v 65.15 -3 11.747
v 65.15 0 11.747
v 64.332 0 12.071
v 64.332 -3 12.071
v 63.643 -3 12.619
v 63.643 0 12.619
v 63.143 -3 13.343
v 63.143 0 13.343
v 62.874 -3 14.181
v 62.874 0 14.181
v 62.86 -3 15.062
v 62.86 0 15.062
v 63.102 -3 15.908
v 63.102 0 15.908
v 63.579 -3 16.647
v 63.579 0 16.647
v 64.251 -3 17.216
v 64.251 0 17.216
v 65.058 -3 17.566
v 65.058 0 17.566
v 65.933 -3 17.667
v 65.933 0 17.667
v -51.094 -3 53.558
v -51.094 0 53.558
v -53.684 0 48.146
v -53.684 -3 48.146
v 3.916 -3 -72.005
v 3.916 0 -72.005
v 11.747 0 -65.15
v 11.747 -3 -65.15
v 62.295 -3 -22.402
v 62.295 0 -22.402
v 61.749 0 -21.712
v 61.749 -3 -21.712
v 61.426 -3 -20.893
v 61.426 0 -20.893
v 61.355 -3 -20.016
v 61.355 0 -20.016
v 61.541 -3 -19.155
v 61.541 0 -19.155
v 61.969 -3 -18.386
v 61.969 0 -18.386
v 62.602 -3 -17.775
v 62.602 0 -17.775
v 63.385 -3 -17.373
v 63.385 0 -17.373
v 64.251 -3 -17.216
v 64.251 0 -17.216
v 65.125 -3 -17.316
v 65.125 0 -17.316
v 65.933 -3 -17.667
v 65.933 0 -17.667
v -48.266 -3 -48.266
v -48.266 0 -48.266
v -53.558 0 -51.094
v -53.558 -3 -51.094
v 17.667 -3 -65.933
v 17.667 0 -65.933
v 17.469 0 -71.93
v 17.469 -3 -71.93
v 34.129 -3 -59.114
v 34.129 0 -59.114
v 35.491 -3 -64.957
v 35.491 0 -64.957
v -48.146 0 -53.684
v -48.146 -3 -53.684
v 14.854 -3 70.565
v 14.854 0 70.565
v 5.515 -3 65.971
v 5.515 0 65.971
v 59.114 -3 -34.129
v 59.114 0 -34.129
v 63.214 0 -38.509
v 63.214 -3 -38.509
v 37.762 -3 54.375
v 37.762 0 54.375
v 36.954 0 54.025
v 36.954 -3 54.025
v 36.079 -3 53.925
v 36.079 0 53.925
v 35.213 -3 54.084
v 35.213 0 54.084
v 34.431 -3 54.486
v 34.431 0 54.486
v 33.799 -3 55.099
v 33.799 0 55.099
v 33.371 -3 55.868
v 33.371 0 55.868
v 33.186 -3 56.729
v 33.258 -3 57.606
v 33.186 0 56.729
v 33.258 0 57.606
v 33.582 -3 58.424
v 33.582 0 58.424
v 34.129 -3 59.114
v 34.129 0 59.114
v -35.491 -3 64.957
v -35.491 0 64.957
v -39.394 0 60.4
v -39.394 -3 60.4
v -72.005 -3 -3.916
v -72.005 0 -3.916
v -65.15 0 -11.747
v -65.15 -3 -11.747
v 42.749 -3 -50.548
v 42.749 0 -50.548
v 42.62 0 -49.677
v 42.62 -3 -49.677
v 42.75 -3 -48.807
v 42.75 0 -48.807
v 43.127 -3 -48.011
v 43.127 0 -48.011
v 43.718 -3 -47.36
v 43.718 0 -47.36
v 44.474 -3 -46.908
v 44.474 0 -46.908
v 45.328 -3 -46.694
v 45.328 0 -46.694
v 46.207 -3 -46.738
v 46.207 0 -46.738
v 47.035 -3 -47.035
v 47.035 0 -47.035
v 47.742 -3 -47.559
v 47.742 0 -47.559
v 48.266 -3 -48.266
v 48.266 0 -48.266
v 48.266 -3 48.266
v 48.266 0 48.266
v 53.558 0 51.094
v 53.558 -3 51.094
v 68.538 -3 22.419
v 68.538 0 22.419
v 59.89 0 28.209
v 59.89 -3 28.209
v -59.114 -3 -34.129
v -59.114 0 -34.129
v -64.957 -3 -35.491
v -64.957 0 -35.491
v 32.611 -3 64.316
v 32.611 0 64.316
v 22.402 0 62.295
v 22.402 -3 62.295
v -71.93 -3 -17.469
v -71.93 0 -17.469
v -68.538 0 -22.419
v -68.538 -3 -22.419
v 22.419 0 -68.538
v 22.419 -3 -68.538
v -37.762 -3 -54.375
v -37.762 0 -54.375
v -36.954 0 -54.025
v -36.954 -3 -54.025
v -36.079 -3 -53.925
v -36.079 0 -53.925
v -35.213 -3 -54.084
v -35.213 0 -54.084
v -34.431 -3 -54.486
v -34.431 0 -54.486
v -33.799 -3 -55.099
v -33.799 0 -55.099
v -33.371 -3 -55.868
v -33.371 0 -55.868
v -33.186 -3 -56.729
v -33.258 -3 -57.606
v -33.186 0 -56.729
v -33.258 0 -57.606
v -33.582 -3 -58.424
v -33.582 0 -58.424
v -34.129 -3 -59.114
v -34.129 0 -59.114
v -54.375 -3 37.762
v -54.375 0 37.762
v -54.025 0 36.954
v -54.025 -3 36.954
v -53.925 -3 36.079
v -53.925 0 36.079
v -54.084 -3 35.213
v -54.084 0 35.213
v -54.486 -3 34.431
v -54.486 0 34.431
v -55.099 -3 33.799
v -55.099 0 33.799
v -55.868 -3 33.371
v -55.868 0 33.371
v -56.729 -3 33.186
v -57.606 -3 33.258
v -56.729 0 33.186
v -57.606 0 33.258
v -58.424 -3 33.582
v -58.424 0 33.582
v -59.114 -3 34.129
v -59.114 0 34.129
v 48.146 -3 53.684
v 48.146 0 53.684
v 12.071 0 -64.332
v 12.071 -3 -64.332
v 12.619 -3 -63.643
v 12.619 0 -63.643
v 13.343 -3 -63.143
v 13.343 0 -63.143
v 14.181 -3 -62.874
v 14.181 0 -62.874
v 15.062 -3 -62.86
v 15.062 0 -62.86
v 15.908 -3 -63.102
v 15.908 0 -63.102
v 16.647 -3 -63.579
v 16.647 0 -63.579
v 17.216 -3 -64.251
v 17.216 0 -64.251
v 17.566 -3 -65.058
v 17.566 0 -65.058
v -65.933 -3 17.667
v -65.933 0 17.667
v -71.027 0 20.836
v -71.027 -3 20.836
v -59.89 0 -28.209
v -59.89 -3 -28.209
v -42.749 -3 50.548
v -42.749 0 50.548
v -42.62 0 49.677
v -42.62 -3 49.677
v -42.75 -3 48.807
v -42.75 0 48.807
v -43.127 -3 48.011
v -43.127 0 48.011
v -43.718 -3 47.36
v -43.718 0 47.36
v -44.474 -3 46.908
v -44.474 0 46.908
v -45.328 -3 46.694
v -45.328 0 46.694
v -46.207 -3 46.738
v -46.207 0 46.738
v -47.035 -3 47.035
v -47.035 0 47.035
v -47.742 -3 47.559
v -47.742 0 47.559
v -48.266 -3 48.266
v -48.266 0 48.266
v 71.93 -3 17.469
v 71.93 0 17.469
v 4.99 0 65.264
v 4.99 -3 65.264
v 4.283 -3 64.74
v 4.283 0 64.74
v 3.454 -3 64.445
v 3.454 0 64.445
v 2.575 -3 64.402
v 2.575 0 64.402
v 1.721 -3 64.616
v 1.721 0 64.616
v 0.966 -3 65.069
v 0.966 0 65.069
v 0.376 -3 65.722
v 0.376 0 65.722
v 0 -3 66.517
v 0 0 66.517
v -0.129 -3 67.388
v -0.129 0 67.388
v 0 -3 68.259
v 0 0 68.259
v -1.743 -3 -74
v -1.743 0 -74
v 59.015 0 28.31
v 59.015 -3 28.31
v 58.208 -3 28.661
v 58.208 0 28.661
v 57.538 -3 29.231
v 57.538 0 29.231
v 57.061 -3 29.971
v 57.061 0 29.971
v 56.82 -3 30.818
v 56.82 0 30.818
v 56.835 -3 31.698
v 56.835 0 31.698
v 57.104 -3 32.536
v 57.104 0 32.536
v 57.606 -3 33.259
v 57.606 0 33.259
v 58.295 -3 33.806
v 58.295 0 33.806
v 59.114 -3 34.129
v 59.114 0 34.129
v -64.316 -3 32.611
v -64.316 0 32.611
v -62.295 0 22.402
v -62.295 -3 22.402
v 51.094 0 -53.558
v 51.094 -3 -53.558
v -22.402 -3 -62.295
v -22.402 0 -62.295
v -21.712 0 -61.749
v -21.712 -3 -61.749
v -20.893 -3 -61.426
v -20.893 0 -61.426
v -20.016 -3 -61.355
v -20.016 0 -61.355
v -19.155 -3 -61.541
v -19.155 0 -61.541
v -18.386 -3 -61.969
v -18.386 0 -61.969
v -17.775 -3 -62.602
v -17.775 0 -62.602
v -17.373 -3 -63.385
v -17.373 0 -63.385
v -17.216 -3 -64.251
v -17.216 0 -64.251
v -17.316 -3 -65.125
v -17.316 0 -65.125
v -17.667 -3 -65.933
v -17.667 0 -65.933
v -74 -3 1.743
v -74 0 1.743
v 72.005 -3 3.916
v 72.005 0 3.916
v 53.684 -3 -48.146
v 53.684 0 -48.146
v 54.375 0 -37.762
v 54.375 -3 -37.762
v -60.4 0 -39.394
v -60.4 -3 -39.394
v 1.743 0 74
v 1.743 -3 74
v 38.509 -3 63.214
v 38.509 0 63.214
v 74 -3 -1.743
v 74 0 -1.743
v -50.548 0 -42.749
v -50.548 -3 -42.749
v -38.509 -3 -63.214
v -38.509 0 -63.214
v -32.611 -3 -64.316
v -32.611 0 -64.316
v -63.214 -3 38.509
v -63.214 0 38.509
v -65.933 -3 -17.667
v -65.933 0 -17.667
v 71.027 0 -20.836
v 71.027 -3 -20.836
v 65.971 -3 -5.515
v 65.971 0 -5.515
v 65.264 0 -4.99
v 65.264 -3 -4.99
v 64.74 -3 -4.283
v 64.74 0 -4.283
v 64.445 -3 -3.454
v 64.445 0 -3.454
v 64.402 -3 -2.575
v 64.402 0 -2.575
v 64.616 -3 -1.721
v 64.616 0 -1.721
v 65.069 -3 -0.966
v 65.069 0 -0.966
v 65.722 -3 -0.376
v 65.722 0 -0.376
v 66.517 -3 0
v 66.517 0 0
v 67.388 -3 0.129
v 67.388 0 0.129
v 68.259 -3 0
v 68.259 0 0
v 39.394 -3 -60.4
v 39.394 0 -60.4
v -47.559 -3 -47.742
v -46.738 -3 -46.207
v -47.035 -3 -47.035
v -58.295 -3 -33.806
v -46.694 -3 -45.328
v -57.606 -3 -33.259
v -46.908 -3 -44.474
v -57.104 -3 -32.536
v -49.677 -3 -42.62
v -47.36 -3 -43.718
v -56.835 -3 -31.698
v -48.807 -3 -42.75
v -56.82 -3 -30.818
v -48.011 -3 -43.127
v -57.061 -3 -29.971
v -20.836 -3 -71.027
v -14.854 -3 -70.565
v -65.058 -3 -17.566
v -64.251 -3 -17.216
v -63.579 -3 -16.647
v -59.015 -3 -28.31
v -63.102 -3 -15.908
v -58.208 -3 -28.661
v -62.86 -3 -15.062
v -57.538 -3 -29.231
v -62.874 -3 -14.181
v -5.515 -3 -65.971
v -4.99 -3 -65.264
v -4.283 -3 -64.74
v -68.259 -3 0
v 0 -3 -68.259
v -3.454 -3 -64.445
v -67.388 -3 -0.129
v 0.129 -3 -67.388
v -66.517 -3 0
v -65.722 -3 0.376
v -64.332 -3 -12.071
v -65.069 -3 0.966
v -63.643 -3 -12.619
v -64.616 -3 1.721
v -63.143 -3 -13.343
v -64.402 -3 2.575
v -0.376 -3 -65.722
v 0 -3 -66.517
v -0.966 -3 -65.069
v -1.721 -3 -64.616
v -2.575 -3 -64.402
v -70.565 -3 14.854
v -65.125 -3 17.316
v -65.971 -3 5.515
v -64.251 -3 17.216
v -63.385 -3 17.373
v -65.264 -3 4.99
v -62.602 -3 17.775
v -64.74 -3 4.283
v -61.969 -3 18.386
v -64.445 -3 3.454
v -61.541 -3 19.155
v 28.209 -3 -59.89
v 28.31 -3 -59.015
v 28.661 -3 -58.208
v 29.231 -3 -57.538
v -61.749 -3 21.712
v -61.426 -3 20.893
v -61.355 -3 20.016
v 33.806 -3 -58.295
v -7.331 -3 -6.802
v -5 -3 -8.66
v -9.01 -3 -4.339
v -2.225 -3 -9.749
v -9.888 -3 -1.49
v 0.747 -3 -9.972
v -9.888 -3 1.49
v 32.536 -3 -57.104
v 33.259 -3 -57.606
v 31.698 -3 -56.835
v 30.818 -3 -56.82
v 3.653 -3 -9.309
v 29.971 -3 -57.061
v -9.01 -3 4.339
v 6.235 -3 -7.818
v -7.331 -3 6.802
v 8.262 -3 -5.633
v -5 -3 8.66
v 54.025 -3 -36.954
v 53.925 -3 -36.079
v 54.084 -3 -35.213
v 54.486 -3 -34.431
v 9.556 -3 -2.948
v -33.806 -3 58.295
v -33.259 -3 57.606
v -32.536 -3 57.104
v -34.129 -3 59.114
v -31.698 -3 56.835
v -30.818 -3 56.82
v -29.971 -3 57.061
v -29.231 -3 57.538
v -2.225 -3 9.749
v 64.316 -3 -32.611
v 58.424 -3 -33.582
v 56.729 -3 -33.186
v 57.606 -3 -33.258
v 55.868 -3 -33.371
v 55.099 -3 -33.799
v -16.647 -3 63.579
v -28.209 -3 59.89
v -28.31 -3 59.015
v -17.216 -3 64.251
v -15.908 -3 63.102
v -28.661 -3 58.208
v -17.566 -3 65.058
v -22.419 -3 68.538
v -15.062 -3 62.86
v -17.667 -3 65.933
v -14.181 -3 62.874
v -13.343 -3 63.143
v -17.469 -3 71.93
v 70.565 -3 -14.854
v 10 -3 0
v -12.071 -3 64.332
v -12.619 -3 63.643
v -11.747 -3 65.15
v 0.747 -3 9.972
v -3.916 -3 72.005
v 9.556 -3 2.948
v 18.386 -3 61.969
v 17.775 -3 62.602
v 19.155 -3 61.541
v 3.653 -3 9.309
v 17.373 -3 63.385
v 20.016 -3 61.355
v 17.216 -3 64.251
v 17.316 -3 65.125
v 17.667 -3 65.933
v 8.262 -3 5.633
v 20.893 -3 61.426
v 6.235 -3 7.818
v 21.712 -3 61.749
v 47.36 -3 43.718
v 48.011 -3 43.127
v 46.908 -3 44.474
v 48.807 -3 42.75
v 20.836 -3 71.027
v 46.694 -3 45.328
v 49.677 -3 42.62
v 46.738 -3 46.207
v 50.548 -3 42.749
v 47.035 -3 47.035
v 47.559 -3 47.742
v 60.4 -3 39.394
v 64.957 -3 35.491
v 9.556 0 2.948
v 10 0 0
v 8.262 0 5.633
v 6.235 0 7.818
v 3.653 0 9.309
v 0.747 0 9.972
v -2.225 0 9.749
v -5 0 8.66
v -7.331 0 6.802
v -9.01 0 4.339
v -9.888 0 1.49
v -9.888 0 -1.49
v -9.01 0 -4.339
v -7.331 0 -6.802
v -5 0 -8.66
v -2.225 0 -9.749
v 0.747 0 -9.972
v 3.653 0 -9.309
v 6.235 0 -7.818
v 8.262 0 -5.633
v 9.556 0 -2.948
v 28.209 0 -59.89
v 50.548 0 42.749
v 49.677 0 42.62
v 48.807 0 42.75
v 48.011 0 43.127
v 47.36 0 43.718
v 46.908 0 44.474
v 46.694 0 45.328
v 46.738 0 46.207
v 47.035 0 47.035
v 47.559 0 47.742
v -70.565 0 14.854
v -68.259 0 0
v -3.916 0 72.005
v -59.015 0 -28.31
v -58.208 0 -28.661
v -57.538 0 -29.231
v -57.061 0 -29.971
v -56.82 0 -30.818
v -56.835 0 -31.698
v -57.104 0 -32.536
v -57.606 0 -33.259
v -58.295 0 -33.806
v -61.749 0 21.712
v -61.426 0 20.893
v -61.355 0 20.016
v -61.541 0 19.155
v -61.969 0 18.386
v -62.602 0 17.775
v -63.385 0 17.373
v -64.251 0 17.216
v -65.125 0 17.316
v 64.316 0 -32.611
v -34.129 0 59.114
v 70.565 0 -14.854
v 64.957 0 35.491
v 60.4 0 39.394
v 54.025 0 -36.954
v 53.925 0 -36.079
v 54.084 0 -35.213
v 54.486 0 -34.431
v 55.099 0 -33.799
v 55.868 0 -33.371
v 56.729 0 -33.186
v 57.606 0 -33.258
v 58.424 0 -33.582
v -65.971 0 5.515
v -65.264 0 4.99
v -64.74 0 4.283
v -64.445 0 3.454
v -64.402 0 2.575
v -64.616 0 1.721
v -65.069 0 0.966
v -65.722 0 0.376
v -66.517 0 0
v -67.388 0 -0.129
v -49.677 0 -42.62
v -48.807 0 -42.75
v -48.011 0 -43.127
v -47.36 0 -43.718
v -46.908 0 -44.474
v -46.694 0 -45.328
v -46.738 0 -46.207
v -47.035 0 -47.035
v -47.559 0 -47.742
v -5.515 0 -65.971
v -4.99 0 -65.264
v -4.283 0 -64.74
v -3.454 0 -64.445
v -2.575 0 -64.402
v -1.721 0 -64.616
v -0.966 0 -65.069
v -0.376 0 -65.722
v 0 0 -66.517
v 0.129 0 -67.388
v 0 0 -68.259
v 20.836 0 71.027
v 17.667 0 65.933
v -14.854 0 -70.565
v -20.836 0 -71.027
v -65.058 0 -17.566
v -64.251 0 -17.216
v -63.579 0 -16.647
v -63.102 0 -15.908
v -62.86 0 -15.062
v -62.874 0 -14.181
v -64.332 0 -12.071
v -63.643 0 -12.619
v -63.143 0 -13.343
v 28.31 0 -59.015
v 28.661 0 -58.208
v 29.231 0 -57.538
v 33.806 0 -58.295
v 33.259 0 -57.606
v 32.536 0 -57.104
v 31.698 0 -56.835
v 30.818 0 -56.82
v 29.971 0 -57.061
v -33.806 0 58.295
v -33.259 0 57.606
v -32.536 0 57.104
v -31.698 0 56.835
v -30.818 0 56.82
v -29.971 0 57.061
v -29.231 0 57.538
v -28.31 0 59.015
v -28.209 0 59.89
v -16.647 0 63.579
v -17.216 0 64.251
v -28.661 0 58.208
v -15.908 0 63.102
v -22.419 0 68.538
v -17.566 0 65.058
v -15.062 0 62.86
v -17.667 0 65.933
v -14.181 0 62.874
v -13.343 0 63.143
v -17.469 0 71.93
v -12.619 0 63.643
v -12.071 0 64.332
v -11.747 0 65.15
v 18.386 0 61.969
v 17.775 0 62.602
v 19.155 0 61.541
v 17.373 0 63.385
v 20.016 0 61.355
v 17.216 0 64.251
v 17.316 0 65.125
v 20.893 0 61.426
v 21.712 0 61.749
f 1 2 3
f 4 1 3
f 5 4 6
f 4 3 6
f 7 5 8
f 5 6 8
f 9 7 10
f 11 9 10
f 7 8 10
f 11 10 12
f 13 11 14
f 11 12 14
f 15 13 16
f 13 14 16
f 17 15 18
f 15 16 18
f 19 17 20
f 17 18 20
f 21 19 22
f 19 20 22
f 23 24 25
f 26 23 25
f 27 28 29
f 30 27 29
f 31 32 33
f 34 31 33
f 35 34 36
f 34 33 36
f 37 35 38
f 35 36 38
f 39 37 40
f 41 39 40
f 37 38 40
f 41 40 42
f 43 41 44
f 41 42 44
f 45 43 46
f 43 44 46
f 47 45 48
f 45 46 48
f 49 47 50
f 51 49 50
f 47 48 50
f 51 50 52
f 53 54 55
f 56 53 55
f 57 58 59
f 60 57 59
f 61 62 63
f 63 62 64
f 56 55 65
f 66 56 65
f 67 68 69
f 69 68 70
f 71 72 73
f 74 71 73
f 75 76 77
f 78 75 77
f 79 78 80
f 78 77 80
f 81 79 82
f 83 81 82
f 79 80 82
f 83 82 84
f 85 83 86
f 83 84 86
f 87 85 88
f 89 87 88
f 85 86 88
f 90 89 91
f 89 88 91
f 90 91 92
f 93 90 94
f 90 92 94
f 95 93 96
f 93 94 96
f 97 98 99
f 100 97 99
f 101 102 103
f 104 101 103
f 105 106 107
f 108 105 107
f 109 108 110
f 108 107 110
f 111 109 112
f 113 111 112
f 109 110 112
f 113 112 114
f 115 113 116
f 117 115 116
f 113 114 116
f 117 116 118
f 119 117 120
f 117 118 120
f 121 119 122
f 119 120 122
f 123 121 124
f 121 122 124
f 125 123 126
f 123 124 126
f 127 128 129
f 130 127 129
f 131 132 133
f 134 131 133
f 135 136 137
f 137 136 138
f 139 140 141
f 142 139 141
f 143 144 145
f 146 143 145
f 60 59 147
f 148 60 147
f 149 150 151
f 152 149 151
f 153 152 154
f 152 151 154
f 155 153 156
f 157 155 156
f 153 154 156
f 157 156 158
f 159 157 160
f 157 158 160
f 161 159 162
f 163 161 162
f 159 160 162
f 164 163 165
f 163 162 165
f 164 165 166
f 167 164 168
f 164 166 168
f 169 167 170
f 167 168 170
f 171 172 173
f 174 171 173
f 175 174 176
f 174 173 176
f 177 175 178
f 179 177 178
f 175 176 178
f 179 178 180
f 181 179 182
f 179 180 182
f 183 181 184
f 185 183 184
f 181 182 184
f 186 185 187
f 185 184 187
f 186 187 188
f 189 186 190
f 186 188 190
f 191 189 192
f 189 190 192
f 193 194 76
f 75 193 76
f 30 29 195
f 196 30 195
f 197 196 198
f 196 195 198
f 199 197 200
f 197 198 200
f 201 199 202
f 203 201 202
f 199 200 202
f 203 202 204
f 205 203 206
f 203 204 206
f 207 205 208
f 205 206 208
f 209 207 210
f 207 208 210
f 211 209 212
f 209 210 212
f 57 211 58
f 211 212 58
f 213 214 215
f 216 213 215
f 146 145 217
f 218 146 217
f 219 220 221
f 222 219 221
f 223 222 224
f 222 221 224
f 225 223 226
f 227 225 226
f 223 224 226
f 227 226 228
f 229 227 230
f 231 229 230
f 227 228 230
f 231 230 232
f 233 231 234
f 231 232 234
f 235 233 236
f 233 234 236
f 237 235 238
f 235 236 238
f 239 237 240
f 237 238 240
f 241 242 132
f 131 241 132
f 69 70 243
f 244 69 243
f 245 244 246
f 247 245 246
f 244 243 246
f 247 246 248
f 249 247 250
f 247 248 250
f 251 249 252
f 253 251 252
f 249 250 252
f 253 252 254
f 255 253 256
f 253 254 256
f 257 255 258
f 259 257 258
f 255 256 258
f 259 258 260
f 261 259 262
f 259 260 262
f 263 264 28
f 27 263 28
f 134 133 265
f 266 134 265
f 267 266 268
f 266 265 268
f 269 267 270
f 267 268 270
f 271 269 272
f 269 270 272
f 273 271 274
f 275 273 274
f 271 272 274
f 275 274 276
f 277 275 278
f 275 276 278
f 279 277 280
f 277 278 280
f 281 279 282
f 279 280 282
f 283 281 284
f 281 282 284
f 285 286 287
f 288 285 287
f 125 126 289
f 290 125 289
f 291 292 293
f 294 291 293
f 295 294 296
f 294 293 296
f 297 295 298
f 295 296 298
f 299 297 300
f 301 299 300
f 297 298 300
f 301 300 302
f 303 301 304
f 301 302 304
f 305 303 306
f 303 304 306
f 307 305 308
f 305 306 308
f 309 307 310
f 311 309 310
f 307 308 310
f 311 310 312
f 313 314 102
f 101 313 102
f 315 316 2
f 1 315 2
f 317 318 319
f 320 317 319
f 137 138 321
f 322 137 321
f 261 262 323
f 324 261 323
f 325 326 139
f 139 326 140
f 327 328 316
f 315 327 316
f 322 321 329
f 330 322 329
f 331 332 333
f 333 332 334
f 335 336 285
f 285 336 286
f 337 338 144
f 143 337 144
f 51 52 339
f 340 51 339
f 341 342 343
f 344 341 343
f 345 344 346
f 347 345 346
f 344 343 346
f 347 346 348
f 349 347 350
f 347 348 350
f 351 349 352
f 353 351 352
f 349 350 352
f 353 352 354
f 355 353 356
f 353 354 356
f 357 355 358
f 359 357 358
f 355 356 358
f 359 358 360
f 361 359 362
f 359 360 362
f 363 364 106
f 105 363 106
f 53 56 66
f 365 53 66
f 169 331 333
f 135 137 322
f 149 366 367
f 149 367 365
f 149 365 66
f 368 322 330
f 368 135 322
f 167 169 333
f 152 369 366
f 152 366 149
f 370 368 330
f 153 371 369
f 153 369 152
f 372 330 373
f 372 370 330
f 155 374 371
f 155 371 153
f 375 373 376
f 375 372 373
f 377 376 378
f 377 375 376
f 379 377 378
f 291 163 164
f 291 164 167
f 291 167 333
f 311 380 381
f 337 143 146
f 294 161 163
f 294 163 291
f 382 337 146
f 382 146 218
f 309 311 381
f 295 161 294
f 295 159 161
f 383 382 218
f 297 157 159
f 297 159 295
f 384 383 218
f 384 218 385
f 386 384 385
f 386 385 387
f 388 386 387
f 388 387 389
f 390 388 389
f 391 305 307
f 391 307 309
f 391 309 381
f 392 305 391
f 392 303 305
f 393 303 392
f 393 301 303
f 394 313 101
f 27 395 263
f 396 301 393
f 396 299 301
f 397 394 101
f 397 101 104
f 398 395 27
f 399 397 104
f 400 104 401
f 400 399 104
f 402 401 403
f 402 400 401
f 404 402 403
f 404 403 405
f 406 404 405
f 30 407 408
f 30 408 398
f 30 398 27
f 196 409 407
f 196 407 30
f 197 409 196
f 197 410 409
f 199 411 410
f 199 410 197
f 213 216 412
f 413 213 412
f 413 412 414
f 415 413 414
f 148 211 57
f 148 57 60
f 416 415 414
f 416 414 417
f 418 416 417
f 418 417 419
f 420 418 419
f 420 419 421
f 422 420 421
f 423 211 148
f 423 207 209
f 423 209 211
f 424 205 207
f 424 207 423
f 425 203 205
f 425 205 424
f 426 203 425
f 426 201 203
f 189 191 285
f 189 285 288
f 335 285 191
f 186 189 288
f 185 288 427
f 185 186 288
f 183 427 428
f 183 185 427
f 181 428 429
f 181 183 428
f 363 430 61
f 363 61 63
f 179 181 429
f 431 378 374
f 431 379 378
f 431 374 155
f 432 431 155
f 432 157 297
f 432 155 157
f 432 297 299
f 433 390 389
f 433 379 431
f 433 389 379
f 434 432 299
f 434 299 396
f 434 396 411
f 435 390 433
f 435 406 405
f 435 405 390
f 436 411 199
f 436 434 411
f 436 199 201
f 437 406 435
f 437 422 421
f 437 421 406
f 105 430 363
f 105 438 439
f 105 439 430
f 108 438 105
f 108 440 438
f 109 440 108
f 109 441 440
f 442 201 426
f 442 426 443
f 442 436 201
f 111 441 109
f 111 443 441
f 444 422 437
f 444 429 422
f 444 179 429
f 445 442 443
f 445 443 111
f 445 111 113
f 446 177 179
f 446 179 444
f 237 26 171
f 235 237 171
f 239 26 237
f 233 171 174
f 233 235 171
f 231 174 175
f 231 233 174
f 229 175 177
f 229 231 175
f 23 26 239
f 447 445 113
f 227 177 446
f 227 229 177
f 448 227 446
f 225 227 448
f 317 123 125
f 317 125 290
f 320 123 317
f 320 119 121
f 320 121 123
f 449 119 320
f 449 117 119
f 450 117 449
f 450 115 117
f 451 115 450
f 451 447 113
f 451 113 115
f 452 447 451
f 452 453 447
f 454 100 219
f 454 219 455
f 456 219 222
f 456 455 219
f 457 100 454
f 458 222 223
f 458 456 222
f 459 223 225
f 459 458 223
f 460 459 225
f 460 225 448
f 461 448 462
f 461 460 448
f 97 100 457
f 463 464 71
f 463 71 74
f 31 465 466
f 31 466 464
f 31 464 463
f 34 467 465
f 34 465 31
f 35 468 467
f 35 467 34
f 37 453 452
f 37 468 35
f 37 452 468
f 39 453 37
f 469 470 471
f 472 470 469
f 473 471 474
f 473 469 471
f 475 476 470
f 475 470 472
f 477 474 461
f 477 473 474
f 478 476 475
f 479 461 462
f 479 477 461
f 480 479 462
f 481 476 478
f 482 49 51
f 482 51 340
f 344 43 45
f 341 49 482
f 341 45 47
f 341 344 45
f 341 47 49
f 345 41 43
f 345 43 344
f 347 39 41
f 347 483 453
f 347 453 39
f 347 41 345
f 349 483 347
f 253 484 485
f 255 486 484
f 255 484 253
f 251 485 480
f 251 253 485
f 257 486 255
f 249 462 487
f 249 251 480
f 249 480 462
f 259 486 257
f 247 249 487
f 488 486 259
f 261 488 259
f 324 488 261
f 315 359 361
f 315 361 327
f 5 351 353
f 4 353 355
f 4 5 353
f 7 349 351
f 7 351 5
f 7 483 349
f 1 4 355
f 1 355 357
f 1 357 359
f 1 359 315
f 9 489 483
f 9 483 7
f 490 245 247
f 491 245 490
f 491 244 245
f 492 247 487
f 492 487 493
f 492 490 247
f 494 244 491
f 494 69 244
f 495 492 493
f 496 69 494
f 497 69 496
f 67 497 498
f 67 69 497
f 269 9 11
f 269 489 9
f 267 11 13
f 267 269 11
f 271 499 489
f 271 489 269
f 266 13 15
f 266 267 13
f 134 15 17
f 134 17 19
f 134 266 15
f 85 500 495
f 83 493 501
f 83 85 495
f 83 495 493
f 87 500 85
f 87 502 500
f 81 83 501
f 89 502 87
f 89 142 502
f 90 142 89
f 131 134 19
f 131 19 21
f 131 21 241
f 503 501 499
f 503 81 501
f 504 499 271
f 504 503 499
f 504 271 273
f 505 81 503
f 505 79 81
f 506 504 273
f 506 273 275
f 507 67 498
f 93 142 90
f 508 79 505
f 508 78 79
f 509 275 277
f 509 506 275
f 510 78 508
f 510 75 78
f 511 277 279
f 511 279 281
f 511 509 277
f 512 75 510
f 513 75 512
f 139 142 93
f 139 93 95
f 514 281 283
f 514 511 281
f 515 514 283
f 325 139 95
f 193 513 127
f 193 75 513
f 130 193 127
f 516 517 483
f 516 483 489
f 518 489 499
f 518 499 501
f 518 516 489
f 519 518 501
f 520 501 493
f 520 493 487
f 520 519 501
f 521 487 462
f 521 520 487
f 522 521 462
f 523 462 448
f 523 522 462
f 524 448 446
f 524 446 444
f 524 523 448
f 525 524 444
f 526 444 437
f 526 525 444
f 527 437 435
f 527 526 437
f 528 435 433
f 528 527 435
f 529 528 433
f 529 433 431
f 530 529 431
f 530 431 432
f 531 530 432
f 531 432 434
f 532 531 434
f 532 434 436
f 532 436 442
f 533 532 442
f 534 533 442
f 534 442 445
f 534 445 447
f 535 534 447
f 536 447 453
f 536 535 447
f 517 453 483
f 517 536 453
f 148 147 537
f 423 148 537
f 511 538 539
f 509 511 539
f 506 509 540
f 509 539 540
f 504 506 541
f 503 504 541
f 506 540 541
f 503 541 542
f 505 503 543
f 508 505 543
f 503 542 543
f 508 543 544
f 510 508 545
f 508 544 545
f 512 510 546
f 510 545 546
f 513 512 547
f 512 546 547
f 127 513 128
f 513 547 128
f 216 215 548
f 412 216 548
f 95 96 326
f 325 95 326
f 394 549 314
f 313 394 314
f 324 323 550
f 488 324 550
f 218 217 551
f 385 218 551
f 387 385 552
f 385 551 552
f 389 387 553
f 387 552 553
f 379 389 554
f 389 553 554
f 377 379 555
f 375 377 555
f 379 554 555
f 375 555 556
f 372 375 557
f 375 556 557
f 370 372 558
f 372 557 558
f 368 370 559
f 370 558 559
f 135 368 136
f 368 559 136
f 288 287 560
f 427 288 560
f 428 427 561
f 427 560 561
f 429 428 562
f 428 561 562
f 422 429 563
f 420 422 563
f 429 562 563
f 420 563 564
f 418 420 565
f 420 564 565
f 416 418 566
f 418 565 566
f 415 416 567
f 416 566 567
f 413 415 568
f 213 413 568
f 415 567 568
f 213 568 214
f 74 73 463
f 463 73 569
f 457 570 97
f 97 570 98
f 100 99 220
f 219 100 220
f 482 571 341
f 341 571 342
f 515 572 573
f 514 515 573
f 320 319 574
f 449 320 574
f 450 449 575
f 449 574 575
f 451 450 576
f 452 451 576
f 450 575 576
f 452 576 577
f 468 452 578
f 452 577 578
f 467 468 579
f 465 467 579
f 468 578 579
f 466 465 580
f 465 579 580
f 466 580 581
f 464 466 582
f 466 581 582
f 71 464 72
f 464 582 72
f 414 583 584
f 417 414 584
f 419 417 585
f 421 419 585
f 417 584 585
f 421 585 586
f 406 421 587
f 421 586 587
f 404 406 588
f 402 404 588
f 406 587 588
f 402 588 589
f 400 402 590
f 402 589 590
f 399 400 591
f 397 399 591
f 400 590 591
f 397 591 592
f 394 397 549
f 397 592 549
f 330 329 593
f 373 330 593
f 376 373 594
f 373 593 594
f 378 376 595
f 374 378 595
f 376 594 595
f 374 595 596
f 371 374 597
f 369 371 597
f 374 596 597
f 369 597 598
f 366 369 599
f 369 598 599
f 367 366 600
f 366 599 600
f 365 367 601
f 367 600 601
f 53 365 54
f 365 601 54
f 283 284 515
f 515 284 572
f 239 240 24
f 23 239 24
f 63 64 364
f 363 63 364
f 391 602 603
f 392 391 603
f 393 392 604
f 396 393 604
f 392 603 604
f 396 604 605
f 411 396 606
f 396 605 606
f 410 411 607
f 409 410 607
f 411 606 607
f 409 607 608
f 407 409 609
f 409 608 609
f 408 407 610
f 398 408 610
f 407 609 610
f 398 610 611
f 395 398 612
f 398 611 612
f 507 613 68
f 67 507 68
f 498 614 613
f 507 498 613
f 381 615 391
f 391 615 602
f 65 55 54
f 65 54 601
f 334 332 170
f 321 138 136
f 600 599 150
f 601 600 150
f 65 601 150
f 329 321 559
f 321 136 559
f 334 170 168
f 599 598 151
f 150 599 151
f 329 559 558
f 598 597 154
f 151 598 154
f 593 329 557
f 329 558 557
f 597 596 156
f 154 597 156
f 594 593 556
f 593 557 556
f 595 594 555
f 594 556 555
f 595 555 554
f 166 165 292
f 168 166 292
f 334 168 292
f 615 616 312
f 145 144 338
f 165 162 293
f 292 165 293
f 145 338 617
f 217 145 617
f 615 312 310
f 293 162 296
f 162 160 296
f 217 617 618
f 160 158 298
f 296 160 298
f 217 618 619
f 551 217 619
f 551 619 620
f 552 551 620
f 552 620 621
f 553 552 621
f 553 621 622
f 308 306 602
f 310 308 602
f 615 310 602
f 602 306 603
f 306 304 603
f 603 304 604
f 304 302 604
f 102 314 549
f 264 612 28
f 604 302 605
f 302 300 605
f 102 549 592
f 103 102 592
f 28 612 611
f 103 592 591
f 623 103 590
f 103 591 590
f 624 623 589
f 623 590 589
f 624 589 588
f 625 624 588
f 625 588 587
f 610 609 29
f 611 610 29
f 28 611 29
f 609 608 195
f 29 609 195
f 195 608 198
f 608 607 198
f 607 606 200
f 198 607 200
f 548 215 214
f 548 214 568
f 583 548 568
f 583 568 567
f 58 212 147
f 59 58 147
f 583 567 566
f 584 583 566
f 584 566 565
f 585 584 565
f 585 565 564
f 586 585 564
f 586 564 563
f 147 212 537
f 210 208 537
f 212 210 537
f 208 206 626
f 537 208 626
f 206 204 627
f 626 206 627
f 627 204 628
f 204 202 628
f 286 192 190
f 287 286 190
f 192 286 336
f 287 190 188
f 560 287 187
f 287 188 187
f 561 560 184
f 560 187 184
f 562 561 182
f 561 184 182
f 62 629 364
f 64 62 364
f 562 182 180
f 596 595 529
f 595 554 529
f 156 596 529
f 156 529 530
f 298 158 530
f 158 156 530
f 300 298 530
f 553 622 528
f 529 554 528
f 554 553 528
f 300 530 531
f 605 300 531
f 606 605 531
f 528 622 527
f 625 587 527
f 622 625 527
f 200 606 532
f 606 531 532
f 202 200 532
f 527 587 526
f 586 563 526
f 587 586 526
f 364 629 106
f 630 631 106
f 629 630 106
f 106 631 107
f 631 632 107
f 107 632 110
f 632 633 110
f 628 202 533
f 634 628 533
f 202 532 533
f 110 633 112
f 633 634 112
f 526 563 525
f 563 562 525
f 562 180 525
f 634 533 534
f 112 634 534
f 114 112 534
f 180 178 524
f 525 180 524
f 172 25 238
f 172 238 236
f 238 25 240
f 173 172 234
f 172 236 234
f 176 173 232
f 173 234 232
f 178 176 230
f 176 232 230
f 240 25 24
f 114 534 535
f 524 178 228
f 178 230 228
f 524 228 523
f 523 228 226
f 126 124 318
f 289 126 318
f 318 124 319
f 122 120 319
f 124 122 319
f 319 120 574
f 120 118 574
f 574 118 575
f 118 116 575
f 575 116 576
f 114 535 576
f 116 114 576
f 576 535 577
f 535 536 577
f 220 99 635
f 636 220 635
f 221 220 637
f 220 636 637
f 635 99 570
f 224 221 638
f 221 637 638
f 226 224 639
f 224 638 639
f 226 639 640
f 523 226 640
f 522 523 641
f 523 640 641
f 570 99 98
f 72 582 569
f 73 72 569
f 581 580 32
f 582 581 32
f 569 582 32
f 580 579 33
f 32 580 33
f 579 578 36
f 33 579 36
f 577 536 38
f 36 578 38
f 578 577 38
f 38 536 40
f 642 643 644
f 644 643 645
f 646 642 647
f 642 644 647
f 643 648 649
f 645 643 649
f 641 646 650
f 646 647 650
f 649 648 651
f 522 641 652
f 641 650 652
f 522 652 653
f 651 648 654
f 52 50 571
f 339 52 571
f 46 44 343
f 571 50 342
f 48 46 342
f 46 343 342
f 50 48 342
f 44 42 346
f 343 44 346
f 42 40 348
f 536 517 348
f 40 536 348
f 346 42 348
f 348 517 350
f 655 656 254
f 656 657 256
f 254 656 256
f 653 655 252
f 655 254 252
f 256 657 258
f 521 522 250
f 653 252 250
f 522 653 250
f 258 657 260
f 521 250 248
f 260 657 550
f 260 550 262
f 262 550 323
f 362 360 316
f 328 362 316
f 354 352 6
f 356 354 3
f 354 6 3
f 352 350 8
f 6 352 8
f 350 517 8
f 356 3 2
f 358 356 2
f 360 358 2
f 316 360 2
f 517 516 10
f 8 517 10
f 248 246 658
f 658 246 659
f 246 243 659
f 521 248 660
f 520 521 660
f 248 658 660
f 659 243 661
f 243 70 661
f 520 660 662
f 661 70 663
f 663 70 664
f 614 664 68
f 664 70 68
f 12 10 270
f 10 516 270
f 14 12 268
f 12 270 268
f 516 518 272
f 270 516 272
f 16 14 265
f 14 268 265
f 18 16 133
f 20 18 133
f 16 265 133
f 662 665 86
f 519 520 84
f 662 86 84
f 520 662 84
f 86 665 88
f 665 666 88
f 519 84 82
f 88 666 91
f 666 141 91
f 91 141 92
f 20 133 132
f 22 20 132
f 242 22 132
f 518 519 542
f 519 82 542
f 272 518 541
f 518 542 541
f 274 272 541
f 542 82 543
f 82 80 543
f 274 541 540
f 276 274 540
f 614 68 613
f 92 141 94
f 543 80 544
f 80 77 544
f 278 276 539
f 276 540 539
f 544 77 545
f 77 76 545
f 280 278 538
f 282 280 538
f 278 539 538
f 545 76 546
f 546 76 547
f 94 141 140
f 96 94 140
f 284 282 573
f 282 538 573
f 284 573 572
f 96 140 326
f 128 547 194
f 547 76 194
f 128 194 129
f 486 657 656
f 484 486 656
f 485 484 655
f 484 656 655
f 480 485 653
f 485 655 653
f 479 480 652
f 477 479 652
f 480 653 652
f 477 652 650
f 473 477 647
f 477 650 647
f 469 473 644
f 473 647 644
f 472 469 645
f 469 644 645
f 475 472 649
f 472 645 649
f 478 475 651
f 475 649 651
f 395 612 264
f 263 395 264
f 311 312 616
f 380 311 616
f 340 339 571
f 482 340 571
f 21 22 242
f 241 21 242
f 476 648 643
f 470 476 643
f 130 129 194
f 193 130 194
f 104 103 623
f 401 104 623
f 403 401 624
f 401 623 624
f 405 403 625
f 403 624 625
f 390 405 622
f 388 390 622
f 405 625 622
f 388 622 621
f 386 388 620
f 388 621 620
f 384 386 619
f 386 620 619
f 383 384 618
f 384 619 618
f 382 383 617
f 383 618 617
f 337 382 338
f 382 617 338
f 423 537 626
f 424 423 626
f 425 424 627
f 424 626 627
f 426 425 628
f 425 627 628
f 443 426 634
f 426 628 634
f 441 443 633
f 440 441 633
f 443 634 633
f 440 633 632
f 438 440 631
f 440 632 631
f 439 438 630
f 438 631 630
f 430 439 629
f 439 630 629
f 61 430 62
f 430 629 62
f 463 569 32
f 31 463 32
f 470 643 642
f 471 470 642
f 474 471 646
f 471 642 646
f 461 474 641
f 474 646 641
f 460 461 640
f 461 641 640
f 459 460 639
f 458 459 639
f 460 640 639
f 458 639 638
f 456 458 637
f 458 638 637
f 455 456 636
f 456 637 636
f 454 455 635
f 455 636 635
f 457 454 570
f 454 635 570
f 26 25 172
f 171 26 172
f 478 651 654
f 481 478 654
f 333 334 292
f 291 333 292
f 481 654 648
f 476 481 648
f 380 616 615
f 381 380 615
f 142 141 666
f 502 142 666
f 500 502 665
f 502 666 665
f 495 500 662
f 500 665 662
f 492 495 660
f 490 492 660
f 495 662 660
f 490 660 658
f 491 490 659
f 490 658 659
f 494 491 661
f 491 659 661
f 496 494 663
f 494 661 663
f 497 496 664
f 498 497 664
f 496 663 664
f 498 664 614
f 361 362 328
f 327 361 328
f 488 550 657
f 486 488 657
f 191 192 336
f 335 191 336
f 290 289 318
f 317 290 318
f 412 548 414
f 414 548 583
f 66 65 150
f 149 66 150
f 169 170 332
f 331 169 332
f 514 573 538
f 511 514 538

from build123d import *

# Parameters (mm, degrees)
F0_R     = 10
F1_DEPTH = 3


with BuildPart() as f1:
    # F0 (on Front) → F1 (new body)
    with BuildSketch(Plane.XZ):
        with BuildLine():
            Line((-3.915787, 72.004935), (-11.747279, 65.150152))
            ThreePointArc((-11.747279, 65.150152), (-15.061523, 62.859987), (-17.66665, 65.932834))
            Line((-17.66665, 65.932834), (-17.469185, 71.929583))
            Line((-17.469185, 71.929583), (-22.418608, 68.537946))
            Line((-22.418608, 68.537946), (-28.209101, 59.889795))
            ThreePointArc((-28.209101, 59.889795), (-30.817676, 56.819876), (-34.129346, 59.113761))
            Line((-34.129346, 59.113761), (-35.490683, 64.957285))
            Line((-35.490683, 64.957285), (-39.393639, 60.400209))
            Line((-39.393639, 60.400209), (-42.748518, 50.548047))
            ThreePointArc((-42.748518, 50.548047), (-44.473655, 46.907584), (-48.266184, 48.266184))
            Line((-48.266184, 48.266184), (-51.093549, 53.558254))
            Line((-51.093549, 53.558254), (-53.684057, 48.146298))
            Line((-53.684057, 48.146298), (-54.374695, 37.761533))
            ThreePointArc((-54.374695, 37.761533), (-55.098828, 33.798618), (-59.113761, 34.129346))
            Line((-59.113761, 34.129346), (-63.214475, 38.509317))
            Line((-63.214475, 38.509317), (-64.315996, 32.611296))
            Line((-64.315996, 32.611296), (-62.295326, 22.401634))
            ThreePointArc((-62.295326, 22.401634), (-61.969107, 18.386332), (-65.932834, 17.66665))
            Line((-65.932834, 17.66665), (-71.027439, 20.836034))
            Line((-71.027439, 20.836034), (-70.564907, 14.853889))
            Line((-70.564907, 14.853889), (-65.970634, 5.5151))
            ThreePointArc((-65.970634, 5.5151), (-64.616294, 1.721047), (-68.258692, 0))
            Line((-68.258692, 0), (-74, 1.742809))
            Line((-74, 1.742809), (-72.004935, -3.915787))
            Line((-72.004935, -3.915787), (-65.150152, -11.747279))
            ThreePointArc((-65.150152, -11.747279), (-62.859987, -15.061523), (-65.932834, -17.66665))
            Line((-65.932834, -17.66665), (-71.929583, -17.469185))
            Line((-71.929583, -17.469185), (-68.537946, -22.418608))
            Line((-68.537946, -22.418608), (-59.889795, -28.209101))
            ThreePointArc((-59.889795, -28.209101), (-56.819876, -30.817676), (-59.113761, -34.129346))
            Line((-59.113761, -34.129346), (-64.957285, -35.490683))
            Line((-64.957285, -35.490683), (-60.400209, -39.393639))
            Line((-60.400209, -39.393639), (-50.548047, -42.748518))
            ThreePointArc((-50.548047, -42.748518), (-46.907584, -44.473655), (-48.266184, -48.266184))
            Line((-48.266184, -48.266184), (-53.558254, -51.093549))
            Line((-53.558254, -51.093549), (-48.146298, -53.684057))
            Line((-48.146298, -53.684057), (-37.761533, -54.374695))
            ThreePointArc((-37.761533, -54.374695), (-33.798618, -55.098828), (-34.129346, -59.113761))
            Line((-34.129346, -59.113761), (-38.509317, -63.214475))
            Line((-38.509317, -63.214475), (-32.611296, -64.315996))
            Line((-32.611296, -64.315996), (-22.401634, -62.295326))
            ThreePointArc((-22.401634, -62.295326), (-18.386332, -61.969107), (-17.66665, -65.932834))
            Line((-17.66665, -65.932834), (-20.836034, -71.027439))
            Line((-20.836034, -71.027439), (-14.853889, -70.564907))
            Line((-14.853889, -70.564907), (-5.5151, -65.970634))
            ThreePointArc((-5.5151, -65.970634), (-1.721047, -64.616294), (0, -68.258692))
            Line((0, -68.258692), (-1.742809, -74))
            Line((-1.742809, -74), (3.915787, -72.004935))
            Line((3.915787, -72.004935), (11.747279, -65.150152))
            ThreePointArc((11.747279, -65.150152), (15.061523, -62.859987), (17.66665, -65.932834))
            Line((17.66665, -65.932834), (17.469185, -71.929583))
            Line((17.469185, -71.929583), (22.418608, -68.537946))
            Line((22.418608, -68.537946), (28.209101, -59.889795))
            ThreePointArc((28.209101, -59.889795), (30.817676, -56.819876), (34.129346, -59.113761))
            Line((34.129346, -59.113761), (35.490683, -64.957285))
            Line((35.490683, -64.957285), (39.393639, -60.400209))
            Line((39.393639, -60.400209), (42.748518, -50.548047))
            ThreePointArc((42.748518, -50.548047), (44.473655, -46.907584), (48.266184, -48.266184))
            Line((48.266184, -48.266184), (51.093549, -53.558254))
            Line((51.093549, -53.558254), (53.684057, -48.146298))
            Line((53.684057, -48.146298), (54.374695, -37.761533))
            ThreePointArc((54.374695, -37.761533), (55.098828, -33.798618), (59.113761, -34.129346))
            Line((59.113761, -34.129346), (63.214475, -38.509317))
            Line((63.214475, -38.509317), (64.315996, -32.611296))
            Line((64.315996, -32.611296), (62.295326, -22.401634))
            ThreePointArc((62.295326, -22.401634), (61.969107, -18.386332), (65.932834, -17.66665))
            Line((65.932834, -17.66665), (71.027439, -20.836034))
            Line((71.027439, -20.836034), (70.564907, -14.853889))
            Line((70.564907, -14.853889), (65.970634, -5.5151))
            ThreePointArc((65.970634, -5.5151), (64.616294, -1.721047), (68.258692, 0))
            Line((68.258692, 0), (74, -1.742809))
            Line((74, -1.742809), (72.004935, 3.915787))
            Line((72.004935, 3.915787), (65.150152, 11.747279))
            ThreePointArc((65.150152, 11.747279), (62.859987, 15.061523), (65.932834, 17.66665))
            Line((65.932834, 17.66665), (71.929583, 17.469185))
            Line((71.929583, 17.469185), (68.537946, 22.418608))
            Line((68.537946, 22.418608), (59.889795, 28.209101))
            ThreePointArc((59.889795, 28.209101), (56.819876, 30.817676), (59.113761, 34.129346))
            Line((59.113761, 34.129346), (64.957285, 35.490683))
            Line((64.957285, 35.490683), (60.400209, 39.393639))
            Line((60.400209, 39.393639), (50.548047, 42.748518))
            ThreePointArc((50.548047, 42.748518), (46.907584, 44.473655), (48.266184, 48.266184))
            Line((48.266184, 48.266184), (53.558254, 51.093549))
            Line((53.558254, 51.093549), (48.146298, 53.684057))
            Line((48.146298, 53.684057), (37.761533, 54.374695))
            ThreePointArc((37.761533, 54.374695), (33.798618, 55.098828), (34.129346, 59.113761))
            Line((34.129346, 59.113761), (38.509317, 63.214475))
            Line((38.509317, 63.214475), (32.611296, 64.315996))
            Line((32.611296, 64.315996), (22.401634, 62.295326))
            ThreePointArc((22.401634, 62.295326), (18.386332, 61.969107), (17.66665, 65.932834))
            Line((17.66665, 65.932834), (20.836034, 71.027439))
            Line((20.836034, 71.027439), (14.853889, 70.564907))
            Line((14.853889, 70.564907), (5.5151, 65.970634))
            ThreePointArc((5.5151, 65.970634), (1.721047, 64.616294), (0, 68.258692))
            Line((0, 68.258692), (1.742809, 74))
            Line((1.742809, 74), (-3.915787, 72.004935))
        make_face()
        Circle(F0_R, mode=Mode.SUBTRACT)
    extrude(amount=F1_DEPTH)


solid = f1.part
